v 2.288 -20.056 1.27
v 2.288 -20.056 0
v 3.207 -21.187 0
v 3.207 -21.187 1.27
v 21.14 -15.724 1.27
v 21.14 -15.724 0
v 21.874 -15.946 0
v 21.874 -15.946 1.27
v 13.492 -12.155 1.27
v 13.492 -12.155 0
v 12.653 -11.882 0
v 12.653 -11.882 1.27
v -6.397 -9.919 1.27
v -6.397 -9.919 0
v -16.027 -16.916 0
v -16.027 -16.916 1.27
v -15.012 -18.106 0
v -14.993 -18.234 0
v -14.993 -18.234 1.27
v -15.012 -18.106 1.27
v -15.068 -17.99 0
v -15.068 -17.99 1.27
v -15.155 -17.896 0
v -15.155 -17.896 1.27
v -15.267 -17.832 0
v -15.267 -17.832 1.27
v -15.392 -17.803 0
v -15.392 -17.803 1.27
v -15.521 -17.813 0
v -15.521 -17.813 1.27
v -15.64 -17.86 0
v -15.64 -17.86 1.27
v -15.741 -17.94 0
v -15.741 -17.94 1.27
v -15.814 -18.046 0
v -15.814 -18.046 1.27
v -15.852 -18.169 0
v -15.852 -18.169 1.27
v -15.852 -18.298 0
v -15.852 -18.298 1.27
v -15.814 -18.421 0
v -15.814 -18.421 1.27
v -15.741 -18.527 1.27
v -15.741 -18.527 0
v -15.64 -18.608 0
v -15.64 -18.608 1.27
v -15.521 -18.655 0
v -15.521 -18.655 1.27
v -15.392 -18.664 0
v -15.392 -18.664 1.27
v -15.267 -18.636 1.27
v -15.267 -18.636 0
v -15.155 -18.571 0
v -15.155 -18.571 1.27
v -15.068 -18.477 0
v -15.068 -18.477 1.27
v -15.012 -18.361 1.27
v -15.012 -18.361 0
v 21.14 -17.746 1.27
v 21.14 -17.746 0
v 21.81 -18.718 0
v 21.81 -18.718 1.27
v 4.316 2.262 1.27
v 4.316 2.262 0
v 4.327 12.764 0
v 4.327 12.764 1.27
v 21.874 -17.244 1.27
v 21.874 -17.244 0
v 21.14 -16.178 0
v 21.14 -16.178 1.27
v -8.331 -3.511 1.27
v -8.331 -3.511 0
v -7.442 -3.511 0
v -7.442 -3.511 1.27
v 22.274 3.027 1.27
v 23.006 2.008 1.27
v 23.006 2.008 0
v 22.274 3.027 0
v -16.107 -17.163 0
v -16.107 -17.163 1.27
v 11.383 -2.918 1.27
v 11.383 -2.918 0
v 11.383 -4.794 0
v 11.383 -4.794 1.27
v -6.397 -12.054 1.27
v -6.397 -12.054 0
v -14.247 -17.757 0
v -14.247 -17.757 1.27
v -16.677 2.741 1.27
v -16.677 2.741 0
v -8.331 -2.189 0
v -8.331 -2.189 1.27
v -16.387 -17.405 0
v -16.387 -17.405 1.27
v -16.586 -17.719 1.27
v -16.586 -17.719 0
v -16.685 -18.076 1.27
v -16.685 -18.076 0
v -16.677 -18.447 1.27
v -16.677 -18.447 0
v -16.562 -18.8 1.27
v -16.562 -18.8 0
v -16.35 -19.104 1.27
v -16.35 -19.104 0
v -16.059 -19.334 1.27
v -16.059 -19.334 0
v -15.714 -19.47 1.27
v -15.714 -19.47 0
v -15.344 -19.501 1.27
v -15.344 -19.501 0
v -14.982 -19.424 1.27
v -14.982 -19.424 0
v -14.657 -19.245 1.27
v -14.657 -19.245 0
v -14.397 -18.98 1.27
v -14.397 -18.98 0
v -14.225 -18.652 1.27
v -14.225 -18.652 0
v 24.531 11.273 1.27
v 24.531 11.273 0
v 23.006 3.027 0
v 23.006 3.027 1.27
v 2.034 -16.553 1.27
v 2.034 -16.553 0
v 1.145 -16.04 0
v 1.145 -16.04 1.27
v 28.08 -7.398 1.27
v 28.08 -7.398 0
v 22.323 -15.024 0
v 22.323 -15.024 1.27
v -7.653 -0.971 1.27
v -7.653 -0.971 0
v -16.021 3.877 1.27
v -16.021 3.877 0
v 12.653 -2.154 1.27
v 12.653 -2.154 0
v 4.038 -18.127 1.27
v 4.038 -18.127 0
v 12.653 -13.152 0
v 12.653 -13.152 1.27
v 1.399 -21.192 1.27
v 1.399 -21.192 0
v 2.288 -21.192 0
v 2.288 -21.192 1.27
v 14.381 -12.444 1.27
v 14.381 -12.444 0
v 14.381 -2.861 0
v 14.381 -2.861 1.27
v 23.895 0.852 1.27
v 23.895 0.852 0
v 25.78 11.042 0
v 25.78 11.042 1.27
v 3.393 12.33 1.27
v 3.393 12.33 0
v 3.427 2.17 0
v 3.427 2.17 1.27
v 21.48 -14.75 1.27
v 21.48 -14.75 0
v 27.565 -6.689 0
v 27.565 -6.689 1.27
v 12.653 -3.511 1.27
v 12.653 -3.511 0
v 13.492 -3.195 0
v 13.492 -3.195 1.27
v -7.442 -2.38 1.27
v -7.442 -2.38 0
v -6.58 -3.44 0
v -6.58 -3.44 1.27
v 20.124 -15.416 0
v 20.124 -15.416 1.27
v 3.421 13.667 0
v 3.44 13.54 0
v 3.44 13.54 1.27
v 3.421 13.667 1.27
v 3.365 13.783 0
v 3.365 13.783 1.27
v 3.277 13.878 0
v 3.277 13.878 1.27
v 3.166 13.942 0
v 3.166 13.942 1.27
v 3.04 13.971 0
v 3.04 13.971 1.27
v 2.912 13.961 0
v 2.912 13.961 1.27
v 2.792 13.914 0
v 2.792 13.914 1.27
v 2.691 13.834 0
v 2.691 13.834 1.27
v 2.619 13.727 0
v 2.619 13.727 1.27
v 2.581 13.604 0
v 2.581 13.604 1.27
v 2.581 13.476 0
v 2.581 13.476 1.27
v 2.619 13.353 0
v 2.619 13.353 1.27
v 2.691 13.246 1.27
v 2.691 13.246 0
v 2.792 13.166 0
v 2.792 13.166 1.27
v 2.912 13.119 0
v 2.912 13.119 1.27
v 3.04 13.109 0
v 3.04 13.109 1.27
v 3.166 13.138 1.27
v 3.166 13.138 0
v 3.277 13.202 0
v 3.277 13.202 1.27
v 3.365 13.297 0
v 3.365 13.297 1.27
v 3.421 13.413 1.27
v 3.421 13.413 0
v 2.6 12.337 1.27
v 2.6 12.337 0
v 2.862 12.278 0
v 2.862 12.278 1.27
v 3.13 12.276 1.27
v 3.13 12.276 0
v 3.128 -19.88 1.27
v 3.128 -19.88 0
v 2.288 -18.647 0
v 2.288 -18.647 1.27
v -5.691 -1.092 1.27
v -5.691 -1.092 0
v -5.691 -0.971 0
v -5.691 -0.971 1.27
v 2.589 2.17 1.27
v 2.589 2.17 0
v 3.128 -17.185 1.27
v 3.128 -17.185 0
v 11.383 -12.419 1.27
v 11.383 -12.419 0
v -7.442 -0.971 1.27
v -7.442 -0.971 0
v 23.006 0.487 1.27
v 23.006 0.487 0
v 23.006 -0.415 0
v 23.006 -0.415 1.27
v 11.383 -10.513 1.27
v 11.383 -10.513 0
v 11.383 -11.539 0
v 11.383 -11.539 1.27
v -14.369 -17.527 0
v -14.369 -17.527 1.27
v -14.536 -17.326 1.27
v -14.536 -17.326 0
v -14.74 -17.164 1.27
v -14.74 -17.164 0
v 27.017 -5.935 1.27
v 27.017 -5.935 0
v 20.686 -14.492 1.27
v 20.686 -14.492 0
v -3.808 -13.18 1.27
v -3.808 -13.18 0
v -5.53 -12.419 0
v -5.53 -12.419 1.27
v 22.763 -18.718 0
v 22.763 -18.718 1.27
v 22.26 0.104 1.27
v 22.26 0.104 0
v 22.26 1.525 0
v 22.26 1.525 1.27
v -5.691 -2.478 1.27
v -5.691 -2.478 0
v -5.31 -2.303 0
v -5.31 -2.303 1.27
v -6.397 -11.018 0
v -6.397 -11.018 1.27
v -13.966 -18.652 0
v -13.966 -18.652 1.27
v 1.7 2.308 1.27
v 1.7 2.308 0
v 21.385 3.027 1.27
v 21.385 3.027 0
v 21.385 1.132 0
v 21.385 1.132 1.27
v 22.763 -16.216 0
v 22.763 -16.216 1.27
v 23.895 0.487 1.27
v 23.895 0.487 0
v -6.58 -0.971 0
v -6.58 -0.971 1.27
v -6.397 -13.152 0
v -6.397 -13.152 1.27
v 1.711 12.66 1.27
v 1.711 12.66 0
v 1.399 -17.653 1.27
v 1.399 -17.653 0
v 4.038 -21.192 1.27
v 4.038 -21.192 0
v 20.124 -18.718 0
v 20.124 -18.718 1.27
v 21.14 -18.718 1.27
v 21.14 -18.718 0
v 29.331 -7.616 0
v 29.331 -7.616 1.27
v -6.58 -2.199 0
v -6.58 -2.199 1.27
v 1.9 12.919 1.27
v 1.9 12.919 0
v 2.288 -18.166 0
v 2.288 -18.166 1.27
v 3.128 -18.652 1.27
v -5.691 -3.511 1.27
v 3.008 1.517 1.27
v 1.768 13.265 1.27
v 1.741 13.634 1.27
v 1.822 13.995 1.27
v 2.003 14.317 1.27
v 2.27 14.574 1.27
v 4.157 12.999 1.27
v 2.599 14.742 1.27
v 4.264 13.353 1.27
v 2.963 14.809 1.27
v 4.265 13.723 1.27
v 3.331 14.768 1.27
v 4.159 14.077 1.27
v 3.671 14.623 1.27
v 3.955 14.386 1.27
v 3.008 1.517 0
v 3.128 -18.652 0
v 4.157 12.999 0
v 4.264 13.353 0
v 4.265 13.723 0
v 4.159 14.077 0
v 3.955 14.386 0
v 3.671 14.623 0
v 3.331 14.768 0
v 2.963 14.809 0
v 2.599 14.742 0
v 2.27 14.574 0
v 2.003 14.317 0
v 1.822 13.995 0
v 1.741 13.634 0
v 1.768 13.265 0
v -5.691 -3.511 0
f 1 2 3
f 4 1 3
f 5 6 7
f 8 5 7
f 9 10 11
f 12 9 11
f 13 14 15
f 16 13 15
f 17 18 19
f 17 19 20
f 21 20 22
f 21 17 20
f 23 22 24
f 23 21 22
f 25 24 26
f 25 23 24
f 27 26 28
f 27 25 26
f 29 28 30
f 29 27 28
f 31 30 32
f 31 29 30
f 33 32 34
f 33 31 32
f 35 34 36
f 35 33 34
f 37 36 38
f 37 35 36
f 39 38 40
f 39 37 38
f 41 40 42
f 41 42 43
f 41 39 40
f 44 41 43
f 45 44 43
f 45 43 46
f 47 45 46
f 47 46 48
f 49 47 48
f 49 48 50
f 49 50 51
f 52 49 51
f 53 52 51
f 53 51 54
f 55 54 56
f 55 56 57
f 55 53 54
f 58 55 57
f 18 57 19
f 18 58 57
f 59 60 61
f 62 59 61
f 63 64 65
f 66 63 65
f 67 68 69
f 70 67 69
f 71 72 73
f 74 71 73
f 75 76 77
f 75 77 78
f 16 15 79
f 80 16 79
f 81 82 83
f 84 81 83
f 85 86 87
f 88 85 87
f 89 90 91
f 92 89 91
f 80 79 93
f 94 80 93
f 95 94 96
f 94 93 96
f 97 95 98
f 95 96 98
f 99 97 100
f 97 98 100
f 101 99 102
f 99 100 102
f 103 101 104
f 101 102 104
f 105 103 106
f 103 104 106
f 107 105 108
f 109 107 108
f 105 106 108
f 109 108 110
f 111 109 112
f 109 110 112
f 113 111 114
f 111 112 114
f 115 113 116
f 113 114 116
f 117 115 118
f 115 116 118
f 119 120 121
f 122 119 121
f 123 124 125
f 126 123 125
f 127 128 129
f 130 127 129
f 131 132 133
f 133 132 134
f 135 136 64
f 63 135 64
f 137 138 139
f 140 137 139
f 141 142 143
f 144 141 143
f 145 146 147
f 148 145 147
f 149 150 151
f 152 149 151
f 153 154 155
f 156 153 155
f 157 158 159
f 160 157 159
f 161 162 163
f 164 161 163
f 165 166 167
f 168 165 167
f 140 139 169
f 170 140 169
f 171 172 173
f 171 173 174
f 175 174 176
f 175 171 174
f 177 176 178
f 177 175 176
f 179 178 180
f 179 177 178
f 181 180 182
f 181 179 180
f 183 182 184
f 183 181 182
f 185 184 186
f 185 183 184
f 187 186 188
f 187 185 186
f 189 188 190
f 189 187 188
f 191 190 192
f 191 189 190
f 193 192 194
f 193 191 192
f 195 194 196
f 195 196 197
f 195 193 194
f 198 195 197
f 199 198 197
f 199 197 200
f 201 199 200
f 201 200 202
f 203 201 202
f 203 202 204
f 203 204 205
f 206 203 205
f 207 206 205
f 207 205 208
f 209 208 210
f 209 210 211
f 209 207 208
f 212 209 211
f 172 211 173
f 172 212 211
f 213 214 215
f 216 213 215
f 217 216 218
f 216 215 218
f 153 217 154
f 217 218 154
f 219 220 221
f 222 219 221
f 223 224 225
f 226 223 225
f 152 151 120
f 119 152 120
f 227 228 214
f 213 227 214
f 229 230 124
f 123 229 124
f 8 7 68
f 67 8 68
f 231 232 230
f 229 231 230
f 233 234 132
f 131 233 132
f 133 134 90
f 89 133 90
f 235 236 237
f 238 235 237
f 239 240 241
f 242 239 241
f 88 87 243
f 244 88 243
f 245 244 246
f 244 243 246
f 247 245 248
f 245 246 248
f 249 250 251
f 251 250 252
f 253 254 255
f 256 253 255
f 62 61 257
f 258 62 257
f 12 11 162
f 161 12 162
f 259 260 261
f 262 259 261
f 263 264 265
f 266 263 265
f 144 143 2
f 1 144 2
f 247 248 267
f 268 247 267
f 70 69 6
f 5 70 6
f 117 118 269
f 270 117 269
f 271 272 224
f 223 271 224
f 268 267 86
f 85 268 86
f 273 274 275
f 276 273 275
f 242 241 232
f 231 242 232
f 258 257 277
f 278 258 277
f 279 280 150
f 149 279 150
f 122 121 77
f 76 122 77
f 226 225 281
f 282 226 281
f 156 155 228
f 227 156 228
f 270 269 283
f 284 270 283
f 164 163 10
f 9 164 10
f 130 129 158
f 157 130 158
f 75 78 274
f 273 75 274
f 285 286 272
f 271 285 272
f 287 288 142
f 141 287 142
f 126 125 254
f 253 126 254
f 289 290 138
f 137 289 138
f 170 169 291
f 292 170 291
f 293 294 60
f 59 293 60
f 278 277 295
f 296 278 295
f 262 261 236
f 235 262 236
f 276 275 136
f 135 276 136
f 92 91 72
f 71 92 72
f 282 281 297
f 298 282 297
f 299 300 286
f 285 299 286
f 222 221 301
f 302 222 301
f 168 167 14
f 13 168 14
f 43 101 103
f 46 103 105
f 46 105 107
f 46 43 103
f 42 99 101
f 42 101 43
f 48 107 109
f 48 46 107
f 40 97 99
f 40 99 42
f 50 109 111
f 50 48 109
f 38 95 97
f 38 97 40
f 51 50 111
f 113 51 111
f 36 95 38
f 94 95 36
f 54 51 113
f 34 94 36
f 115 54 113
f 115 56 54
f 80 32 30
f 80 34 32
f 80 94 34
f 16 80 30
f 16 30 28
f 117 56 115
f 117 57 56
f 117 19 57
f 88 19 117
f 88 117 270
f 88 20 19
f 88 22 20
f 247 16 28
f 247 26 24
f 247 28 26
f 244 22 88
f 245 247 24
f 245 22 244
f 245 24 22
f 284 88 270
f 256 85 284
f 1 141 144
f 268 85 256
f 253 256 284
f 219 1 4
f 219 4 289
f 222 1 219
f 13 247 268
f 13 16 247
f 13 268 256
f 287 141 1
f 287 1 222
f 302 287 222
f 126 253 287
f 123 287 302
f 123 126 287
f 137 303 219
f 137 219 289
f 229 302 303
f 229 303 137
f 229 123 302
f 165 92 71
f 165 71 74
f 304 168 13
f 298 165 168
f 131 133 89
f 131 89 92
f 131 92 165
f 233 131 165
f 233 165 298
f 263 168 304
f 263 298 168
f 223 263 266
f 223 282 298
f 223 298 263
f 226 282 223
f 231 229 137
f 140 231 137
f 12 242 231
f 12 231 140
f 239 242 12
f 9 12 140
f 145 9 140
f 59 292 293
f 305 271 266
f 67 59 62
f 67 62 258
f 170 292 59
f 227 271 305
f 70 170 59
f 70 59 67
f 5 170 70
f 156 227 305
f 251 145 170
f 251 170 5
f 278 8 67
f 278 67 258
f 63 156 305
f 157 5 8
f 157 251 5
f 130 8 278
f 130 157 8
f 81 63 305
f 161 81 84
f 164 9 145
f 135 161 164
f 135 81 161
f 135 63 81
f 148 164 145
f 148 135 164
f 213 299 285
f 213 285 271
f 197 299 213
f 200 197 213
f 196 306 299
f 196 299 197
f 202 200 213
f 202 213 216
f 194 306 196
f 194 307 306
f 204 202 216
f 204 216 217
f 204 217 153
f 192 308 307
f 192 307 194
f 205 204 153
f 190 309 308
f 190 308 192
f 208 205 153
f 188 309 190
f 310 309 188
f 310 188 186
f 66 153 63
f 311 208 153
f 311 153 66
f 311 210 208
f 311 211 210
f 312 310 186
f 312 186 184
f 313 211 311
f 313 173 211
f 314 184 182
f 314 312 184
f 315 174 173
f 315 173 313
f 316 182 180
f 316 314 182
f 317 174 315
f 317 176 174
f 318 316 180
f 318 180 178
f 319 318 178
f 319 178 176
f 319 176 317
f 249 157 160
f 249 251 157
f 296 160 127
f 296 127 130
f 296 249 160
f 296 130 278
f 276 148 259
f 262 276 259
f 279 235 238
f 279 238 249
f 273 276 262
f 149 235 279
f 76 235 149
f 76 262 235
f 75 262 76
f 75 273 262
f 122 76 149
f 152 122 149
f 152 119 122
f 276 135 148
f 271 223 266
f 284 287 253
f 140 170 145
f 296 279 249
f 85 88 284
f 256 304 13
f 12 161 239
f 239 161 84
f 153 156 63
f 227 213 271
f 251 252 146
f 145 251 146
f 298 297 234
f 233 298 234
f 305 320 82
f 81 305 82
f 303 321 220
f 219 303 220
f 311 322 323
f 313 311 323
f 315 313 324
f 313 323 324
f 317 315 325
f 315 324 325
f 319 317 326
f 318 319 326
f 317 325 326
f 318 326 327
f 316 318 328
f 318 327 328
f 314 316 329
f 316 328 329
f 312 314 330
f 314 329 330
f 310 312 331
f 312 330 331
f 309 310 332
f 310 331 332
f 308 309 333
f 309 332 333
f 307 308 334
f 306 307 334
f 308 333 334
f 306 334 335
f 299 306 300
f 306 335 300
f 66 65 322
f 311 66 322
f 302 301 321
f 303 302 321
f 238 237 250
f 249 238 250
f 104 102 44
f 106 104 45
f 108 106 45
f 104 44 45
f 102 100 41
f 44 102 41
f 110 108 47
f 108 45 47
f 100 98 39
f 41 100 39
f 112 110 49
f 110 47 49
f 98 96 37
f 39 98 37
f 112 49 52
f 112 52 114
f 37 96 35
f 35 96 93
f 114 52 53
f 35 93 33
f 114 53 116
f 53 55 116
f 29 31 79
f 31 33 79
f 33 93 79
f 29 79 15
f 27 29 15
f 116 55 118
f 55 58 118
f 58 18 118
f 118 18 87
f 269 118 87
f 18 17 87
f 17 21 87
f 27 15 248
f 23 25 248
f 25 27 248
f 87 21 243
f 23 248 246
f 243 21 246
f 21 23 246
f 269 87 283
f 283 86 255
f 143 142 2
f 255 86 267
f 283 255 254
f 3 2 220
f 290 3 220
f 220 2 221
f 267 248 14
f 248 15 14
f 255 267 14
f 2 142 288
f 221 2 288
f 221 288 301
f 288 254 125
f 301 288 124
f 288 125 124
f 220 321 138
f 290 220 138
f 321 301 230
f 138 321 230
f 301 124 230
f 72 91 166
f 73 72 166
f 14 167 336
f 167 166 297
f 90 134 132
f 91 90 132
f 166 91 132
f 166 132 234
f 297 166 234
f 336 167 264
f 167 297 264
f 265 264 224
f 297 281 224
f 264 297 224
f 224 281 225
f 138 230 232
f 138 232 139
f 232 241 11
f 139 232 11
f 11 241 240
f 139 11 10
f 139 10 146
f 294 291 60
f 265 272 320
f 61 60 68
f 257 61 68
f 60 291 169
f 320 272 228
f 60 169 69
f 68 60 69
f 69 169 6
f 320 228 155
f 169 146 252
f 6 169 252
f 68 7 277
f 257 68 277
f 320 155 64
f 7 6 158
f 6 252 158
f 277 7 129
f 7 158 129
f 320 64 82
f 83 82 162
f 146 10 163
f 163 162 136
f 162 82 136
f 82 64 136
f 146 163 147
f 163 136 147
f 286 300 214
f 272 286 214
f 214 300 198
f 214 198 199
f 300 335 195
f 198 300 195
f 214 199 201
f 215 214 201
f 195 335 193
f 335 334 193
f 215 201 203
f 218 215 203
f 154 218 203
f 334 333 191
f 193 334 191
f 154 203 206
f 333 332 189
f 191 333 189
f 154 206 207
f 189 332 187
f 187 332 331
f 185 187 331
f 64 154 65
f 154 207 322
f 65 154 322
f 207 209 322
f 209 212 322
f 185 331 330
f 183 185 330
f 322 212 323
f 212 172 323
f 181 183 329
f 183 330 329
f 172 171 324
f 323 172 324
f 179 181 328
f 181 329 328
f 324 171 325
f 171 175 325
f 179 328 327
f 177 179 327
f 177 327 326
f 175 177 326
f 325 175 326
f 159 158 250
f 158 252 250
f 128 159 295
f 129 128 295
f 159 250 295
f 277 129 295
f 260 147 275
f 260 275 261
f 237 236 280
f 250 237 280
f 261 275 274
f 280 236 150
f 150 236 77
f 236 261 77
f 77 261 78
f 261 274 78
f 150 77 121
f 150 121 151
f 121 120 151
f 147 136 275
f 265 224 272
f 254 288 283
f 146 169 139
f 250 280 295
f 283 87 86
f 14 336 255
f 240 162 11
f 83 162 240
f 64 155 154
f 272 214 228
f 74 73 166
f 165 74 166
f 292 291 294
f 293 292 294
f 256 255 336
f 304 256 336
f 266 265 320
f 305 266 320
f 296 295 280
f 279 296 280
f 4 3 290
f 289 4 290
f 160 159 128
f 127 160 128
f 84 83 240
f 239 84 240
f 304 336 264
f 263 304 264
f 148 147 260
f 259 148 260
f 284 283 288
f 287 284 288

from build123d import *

# Parameters (mm, degrees)
F0_R     = 0.4318
F1_DEPTH = 1.27


with BuildPart() as f1:
    # F0 (on Top) → F1 (new body)
    with BuildSketch(Plane.XY):
        with BuildLine():
            Line((12.65347, -2.153963), (4.316134, 2.261672))
            Line((4.316134, 2.261672), (4.327364, 12.763659))
            Line((4.327364, 12.763659), (4.156866, 12.998858))
            ThreePointArc((4.156866, 12.998858), (2.963087, 14.80923), (1.900066, 12.919114))
            Line((1.900066, 12.919114), (1.711051, 12.659542))
            Line((1.711051, 12.659542), (1.699981, 2.307537))
            Line((1.699981, 2.307537), (-5.691423, -1.091549))
            Line((-5.691423, -1.091549), (-5.691423, -2.478054))
            Line((-5.691423, -2.478054), (-5.310308, -2.303015))
            Line((-5.310308, -2.303015), (3.007935, 1.517402))
            Line((3.007935, 1.517402), (11.38347, -2.918464))
            Line((11.38347, -2.918464), (11.38347, -3.767079))
            Line((11.38347, -3.767079), (11.38347, -4.793607))
            Line((11.38347, -4.793607), (11.383473, -10.512839))
            Line((11.383473, -10.512839), (11.383474, -11.539368))
            Line((11.383474, -11.539368), (11.383474, -12.419249))
            Line((11.383474, -12.419249), (3.128473, -17.185279))
            Line((3.128473, -17.185279), (2.03357, -16.553137))
            Line((2.03357, -16.553137), (1.14457, -16.039872))
            Line((1.14457, -16.039872), (-3.808432, -13.180257))
            Line((-3.808432, -13.180257), (-5.529587, -12.419254))
            Line((-5.529587, -12.419254), (-5.691423, -3.510934))
            Line((-5.691423, -3.510934), (-6.522282, -3.510934))
            Line((-6.522282, -3.510934), (-6.580308, -3.439569))
            Line((-6.580308, -3.439569), (-6.396528, -9.918688))
            Line((-6.396528, -9.918688), (-16.026936, -16.915588))
            Line((-16.026936, -16.915588), (-16.107216, -17.162667))
            ThreePointArc((-16.107216, -17.162667), (-16.212667, -19.229532), (-14.225404, -18.651748))
            Line((-14.225404, -18.651748), (-13.96561, -18.651748))
            Line((-13.96561, -18.651748), (-6.396528, -13.152489))
            Line((-6.396528, -13.152489), (1.39857, -17.652989))
            Line((1.39857, -17.652989), (1.39857, -18.651748))
            Line((1.39857, -18.651748), (1.39857, -21.191748))
            Line((1.39857, -21.191748), (2.28757, -21.191748))
            Line((2.28757, -21.191748), (2.28757, -20.055981))
            Line((2.28757, -20.055981), (3.207054, -21.186821))
            Line((3.207054, -21.186821), (4.037913, -21.191748))
            Line((4.037913, -21.191748), (4.037913, -18.646821))
            Line((4.037913, -18.646821), (4.037913, -18.126682))
            Line((4.037913, -18.126682), (12.653472, -13.152485))
            Line((12.653472, -13.152485), (20.12443, -15.416135))
            Line((20.12443, -15.416135), (20.12443, -16.178135))
            Line((20.12443, -16.178135), (20.12443, -18.718135))
            Line((20.12443, -18.718135), (21.140028, -18.718135))
            Line((21.140028, -18.718135), (21.140028, -17.745525))
            Line((21.140028, -17.745525), (21.809838, -18.718135))
            Line((21.809838, -18.718135), (22.763277, -18.718135))
            Line((22.763277, -18.718135), (22.763277, -16.215688))
            Line((22.763277, -16.215688), (29.330721, -7.616372))
            Line((29.330721, -7.616372), (23.89467, 0.487487))
            Line((23.89467, 0.487487), (23.89467, 0.851521))
            Line((23.89467, 0.851521), (23.89467, 3.027487))
            Line((23.89467, 3.027487), (23.00567, 3.027487))
            Line((23.00567, 3.027487), (23.00567, 2.007953))
            Line((23.00567, 2.007953), (22.273508, 3.027487))
            Line((22.273508, 3.027487), (21.384508, 3.027487))
            Line((21.384508, 3.027487), (21.384508, 1.132124))
            Line((21.384508, 1.132124), (12.65347, -2.153963))
        make_face()
        with Locations((-15.424598, -18.233617)):
            Circle(F0_R, mode=Mode.SUBTRACT)
        with BuildLine():
            Line((-14.7405, -17.163612), (-6.396528, -11.017552))
            Line((-6.396528, -11.017552), (-6.396528, -12.053624))
            Line((-6.396528, -12.053624), (-14.247226, -17.75749))
            ThreePointArc((-14.247226, -17.75749), (-14.447644, -17.422161), (-14.7405, -17.163612))
        make_face(mode=Mode.SUBTRACT)
        Polygon((2.28757, -18.166253), (3.128473, -18.651748), (3.128473, -19.879702), (2.28757, -18.646821), align=None, mode=Mode.SUBTRACT)
        Polygon((21.874277, -17.244328), (21.140028, -16.178135), (21.140028, -15.723854), (21.874277, -15.946327), (21.874277, -16.178135), align=None, mode=Mode.SUBTRACT)
        Polygon((12.653474, -11.882485), (12.65347, -3.510934), (13.49167, -3.195462), (13.49167, -12.154831), align=None, mode=Mode.SUBTRACT)
        Polygon((27.564501, -6.689476), (28.079566, -7.398402), (22.323207, -15.02437), (21.47986, -14.75035), align=None, mode=Mode.SUBTRACT)
        Polygon((23.00567, 0.487487), (23.00567, -0.414785), (27.016591, -5.935343), (20.685605, -14.492281), (14.38067, -12.443685), (14.38067, -2.860871), (22.259525, 0.104481), (22.259525, 0.487487), (22.259525, 1.524642), align=None, mode=Mode.SUBTRACT)
        with BuildLine():
            Line((3.392922, 12.32978), (3.427035, 2.169838))
            Line((3.427035, 2.169838), (2.588835, 2.169838))
            Line((2.588835, 2.169838), (2.599707, 12.33742))
            ThreePointArc((2.599707, 12.33742), (2.995703, 12.270081), (3.392922, 12.32978))
        make_face(mode=Mode.SUBTRACT)
        with Locations((3.007935, 13.540022)):
            Circle(F0_R, mode=Mode.SUBTRACT)
        Polygon((-8.330766, -0.970934), (-7.652898, -0.970934), (-16.021372, 3.877039), (-16.676927, 2.740892), (-8.330766, -2.189404), align=None)
        Polygon((-5.691423, -2.478054), (-5.691423, -1.091549), (-5.691423, -0.970934), (-6.580423, -0.970934), (-6.580423, -2.198888), (-7.441766, -0.970934), (-7.652898, -0.970934), (-8.330766, -0.970934), (-8.330766, -2.189404), (-8.330766, -3.510934), (-7.441766, -3.510934), (-7.441766, -2.380094), (-6.580308, -3.439569), (-6.522282, -3.510934), (-5.691423, -3.510934), align=None)
        Polygon((24.531044, 11.272838), (23.00567, 3.027487), (23.89467, 3.027487), (23.89467, 0.851521), (25.779854, 11.04181), align=None)
    extrude(amount=F1_DEPTH)


solid = f1.part
